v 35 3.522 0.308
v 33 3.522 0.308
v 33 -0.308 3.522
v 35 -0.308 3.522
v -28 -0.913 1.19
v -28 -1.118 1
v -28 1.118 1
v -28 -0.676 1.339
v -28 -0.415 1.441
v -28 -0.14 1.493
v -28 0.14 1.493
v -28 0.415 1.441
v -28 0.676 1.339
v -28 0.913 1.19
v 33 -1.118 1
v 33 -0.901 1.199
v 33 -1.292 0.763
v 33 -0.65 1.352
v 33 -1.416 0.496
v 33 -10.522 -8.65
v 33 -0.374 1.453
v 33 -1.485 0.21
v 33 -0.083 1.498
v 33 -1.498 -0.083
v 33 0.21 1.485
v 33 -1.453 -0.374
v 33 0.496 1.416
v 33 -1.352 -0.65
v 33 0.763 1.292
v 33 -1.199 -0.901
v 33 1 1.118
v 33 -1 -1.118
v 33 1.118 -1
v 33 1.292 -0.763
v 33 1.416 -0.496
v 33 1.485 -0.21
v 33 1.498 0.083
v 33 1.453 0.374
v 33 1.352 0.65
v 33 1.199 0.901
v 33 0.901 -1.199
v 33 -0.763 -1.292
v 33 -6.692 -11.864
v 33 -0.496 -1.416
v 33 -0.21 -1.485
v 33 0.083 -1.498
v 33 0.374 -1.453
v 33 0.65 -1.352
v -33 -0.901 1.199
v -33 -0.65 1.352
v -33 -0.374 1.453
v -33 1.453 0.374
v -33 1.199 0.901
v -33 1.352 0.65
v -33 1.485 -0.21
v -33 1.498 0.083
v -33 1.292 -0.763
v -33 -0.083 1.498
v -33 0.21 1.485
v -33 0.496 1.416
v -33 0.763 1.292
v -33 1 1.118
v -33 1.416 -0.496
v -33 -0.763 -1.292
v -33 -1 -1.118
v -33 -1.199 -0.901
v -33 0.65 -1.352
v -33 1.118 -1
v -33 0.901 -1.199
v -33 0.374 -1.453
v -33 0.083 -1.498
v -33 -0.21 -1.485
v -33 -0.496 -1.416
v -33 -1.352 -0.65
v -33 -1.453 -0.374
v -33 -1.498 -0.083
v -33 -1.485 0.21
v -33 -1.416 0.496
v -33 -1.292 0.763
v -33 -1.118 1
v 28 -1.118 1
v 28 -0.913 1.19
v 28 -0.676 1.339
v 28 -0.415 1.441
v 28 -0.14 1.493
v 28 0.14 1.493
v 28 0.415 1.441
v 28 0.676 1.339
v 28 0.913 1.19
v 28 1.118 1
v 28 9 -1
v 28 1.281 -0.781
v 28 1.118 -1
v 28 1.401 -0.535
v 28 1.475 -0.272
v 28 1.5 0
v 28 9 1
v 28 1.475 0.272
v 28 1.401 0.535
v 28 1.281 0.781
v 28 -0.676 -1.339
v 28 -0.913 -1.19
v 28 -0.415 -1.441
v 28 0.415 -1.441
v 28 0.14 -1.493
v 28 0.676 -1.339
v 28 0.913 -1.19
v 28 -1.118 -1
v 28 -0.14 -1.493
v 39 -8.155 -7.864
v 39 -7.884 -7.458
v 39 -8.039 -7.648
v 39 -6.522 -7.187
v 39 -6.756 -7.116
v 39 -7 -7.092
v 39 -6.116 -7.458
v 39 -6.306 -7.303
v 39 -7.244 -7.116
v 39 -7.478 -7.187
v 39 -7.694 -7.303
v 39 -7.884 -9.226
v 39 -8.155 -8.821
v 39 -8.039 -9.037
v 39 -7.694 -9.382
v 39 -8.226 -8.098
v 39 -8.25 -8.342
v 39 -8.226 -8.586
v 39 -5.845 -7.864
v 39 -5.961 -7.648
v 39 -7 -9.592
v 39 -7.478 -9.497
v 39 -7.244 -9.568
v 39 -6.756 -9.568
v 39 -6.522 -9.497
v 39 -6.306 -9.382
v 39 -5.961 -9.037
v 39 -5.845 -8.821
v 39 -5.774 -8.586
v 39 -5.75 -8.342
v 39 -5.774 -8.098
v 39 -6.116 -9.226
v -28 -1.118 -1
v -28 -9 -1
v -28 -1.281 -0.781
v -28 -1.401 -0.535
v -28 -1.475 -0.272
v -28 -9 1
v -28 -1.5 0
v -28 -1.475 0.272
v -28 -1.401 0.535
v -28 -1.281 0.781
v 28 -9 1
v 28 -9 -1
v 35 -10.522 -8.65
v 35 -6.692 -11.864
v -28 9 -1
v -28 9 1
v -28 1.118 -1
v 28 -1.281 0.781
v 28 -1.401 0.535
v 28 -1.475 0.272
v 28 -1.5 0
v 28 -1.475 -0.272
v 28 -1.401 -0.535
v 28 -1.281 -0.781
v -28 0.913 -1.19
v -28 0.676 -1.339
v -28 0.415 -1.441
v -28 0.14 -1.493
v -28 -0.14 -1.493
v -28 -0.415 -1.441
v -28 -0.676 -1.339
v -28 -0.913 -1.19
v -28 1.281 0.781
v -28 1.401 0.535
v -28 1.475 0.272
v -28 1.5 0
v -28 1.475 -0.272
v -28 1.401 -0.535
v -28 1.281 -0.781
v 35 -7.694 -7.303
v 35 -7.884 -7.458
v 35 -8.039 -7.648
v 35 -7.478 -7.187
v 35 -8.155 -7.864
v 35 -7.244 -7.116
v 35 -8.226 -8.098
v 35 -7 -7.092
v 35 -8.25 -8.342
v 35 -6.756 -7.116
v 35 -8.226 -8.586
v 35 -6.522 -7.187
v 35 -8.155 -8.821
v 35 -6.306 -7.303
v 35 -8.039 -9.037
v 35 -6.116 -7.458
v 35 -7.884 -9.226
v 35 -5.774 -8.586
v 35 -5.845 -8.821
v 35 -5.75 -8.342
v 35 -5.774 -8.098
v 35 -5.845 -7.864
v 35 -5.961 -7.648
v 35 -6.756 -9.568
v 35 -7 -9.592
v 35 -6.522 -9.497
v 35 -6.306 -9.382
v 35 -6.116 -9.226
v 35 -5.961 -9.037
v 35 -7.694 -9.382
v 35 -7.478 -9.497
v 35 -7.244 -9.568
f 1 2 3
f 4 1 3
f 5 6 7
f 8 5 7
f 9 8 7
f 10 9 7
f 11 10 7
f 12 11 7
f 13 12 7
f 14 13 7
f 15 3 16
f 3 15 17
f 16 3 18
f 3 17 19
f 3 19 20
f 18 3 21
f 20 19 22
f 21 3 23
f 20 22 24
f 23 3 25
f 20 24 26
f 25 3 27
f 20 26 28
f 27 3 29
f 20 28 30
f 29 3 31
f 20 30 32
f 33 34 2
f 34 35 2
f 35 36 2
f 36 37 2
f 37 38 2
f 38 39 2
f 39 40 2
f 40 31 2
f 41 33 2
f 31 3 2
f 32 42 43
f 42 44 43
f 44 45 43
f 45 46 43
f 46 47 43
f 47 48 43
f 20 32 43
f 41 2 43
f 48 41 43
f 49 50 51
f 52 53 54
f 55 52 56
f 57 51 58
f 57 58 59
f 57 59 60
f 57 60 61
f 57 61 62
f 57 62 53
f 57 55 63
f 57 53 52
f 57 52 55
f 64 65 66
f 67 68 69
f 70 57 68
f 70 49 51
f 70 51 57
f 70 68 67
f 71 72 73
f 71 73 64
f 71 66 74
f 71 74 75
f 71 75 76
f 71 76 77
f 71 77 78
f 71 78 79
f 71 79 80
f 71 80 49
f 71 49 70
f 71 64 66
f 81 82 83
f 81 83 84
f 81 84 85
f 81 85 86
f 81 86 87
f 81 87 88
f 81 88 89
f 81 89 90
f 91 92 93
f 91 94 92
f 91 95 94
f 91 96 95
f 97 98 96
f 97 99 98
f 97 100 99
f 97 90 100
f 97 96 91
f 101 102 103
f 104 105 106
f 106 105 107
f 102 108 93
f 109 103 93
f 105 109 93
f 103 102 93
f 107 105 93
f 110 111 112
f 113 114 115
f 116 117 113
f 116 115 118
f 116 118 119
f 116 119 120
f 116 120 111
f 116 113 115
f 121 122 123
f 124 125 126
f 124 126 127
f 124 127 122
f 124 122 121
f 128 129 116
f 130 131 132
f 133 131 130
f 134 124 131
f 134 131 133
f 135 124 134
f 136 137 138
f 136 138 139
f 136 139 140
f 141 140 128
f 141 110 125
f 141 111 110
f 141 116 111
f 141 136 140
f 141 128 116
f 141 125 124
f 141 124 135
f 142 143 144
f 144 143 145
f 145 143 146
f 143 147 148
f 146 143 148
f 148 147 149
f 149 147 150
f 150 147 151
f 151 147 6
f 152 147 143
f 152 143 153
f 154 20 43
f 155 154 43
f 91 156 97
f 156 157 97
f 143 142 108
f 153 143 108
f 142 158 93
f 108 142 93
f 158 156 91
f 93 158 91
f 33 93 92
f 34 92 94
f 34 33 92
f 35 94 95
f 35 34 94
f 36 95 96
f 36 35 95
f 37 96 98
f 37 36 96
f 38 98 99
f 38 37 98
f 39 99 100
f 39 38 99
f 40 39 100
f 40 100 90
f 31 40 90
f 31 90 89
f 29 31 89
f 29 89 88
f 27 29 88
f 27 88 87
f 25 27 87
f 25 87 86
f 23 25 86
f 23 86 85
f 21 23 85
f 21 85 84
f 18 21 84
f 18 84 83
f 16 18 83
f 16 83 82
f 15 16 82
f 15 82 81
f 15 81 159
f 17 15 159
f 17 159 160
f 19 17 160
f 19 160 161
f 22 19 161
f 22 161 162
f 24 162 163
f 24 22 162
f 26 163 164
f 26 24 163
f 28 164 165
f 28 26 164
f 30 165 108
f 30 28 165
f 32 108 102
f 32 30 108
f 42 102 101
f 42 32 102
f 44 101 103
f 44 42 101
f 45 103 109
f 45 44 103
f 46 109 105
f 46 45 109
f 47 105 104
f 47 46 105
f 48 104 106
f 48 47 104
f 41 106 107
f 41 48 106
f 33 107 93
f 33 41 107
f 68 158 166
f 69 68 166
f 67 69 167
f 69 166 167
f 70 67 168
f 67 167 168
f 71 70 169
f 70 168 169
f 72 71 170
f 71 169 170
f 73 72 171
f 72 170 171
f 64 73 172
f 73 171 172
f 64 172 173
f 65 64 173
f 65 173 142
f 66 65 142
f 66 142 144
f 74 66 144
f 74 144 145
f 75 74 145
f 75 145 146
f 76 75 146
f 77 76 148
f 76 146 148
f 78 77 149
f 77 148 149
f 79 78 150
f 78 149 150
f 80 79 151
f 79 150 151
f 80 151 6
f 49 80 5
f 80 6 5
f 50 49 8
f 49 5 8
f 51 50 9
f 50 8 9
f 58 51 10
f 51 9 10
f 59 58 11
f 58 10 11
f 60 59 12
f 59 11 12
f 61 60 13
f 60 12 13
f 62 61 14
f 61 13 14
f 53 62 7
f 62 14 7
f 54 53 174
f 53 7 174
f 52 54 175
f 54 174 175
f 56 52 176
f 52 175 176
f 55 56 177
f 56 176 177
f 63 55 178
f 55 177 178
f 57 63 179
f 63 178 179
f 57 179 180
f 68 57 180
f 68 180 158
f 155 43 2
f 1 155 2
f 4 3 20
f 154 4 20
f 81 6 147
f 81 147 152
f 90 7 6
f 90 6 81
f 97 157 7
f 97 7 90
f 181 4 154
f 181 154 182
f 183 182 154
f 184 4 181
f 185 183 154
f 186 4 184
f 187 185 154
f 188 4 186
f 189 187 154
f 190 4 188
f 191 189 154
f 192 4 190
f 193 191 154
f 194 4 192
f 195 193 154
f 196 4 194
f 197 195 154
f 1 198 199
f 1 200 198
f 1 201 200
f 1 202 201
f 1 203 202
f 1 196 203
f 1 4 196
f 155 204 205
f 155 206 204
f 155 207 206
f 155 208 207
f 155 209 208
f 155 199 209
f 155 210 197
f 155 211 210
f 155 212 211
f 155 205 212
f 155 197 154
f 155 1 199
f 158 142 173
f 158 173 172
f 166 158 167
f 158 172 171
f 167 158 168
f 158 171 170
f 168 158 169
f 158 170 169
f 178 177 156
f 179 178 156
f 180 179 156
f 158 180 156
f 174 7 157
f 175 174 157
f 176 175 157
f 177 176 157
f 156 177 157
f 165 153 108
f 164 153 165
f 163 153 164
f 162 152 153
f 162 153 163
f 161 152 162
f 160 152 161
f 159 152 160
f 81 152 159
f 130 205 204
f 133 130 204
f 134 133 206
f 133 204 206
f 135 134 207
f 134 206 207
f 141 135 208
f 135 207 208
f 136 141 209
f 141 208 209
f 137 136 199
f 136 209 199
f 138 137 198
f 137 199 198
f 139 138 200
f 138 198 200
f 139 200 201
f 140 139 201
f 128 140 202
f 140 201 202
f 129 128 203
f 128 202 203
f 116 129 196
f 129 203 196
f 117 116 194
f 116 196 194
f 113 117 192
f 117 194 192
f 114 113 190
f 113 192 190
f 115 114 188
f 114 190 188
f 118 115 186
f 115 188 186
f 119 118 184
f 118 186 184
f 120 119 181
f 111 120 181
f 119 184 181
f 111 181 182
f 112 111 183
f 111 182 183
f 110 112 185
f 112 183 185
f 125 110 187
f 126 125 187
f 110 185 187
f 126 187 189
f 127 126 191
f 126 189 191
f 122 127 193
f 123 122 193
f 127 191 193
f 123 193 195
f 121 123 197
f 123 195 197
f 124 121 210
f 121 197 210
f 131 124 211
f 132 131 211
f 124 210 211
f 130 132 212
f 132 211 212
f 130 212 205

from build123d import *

# Parameters (mm, degrees)
SKETCH1_W           = 56
SKETCH1_H           = 18
LOUVER_FLAP_DEPTH   = 1
SKETCH2_R           = 1.5
PIVOT_SHAFT_L_DEPTH = 5
PIVOT_SHAFT_R_START = 5
SKETCH3_R           = 1.5
PIVOT_SHAFT_R_DEPTH = 5
CRANK_ARM_DEPTH     = 2
SKETCH5_R           = 1.25
CRANK_PIN_DEPTH     = 4


with BuildPart() as part:
    # Sketch1 → Louver_Flap (new, symmetric)
    with BuildSketch(Plane.XY):
        Rectangle(SKETCH1_W, SKETCH1_H)
    extrude(amount=LOUVER_FLAP_DEPTH, both=True)

    # Sketch2 → Pivot_Shaft_L (add)
    with BuildSketch(Plane.ZY.offset(28)):
        with Locations(Location((0, 0, 0), (0, 0, 131.810314896))):
            Circle(SKETCH2_R)
    extrude(amount=PIVOT_SHAFT_L_DEPTH)

    # Sketch3 → Pivot_Shaft_R (add)
    with BuildSketch(Plane(origin=(28, 0, 0), x_dir=(0, 0, -1), z_dir=(1, 0, 0)).offset(PIVOT_SHAFT_R_START)):
        with Locations(Location((0, 0, 0), (0, 0, 48.189685104))):
            Circle(SKETCH3_R)
    extrude(amount=-PIVOT_SHAFT_R_DEPTH)

    # Sketch4 → Crank_Arm (add)
    with BuildSketch(Plane(origin=(33, 0, 0), x_dir=(0, 0, -1), z_dir=(1, 0, 0))):
        Polygon((-3.522080132, -0.308142084), (8.650417232, -10.522080132), (11.86435528, -6.691857916), (-0.308142084, 3.522080132), align=None)
    extrude(amount=CRANK_ARM_DEPTH)

    # Sketch5 → Crank_Pin (add)
    with BuildSketch(Plane(origin=(35, 0, 0), x_dir=(0, 0, -1), z_dir=(1, 0, 0))):
        with Locations((8.342275148, -7)):
            Circle(SKETCH5_R)
    extrude(amount=CRANK_PIN_DEPTH)


solid = part.part
